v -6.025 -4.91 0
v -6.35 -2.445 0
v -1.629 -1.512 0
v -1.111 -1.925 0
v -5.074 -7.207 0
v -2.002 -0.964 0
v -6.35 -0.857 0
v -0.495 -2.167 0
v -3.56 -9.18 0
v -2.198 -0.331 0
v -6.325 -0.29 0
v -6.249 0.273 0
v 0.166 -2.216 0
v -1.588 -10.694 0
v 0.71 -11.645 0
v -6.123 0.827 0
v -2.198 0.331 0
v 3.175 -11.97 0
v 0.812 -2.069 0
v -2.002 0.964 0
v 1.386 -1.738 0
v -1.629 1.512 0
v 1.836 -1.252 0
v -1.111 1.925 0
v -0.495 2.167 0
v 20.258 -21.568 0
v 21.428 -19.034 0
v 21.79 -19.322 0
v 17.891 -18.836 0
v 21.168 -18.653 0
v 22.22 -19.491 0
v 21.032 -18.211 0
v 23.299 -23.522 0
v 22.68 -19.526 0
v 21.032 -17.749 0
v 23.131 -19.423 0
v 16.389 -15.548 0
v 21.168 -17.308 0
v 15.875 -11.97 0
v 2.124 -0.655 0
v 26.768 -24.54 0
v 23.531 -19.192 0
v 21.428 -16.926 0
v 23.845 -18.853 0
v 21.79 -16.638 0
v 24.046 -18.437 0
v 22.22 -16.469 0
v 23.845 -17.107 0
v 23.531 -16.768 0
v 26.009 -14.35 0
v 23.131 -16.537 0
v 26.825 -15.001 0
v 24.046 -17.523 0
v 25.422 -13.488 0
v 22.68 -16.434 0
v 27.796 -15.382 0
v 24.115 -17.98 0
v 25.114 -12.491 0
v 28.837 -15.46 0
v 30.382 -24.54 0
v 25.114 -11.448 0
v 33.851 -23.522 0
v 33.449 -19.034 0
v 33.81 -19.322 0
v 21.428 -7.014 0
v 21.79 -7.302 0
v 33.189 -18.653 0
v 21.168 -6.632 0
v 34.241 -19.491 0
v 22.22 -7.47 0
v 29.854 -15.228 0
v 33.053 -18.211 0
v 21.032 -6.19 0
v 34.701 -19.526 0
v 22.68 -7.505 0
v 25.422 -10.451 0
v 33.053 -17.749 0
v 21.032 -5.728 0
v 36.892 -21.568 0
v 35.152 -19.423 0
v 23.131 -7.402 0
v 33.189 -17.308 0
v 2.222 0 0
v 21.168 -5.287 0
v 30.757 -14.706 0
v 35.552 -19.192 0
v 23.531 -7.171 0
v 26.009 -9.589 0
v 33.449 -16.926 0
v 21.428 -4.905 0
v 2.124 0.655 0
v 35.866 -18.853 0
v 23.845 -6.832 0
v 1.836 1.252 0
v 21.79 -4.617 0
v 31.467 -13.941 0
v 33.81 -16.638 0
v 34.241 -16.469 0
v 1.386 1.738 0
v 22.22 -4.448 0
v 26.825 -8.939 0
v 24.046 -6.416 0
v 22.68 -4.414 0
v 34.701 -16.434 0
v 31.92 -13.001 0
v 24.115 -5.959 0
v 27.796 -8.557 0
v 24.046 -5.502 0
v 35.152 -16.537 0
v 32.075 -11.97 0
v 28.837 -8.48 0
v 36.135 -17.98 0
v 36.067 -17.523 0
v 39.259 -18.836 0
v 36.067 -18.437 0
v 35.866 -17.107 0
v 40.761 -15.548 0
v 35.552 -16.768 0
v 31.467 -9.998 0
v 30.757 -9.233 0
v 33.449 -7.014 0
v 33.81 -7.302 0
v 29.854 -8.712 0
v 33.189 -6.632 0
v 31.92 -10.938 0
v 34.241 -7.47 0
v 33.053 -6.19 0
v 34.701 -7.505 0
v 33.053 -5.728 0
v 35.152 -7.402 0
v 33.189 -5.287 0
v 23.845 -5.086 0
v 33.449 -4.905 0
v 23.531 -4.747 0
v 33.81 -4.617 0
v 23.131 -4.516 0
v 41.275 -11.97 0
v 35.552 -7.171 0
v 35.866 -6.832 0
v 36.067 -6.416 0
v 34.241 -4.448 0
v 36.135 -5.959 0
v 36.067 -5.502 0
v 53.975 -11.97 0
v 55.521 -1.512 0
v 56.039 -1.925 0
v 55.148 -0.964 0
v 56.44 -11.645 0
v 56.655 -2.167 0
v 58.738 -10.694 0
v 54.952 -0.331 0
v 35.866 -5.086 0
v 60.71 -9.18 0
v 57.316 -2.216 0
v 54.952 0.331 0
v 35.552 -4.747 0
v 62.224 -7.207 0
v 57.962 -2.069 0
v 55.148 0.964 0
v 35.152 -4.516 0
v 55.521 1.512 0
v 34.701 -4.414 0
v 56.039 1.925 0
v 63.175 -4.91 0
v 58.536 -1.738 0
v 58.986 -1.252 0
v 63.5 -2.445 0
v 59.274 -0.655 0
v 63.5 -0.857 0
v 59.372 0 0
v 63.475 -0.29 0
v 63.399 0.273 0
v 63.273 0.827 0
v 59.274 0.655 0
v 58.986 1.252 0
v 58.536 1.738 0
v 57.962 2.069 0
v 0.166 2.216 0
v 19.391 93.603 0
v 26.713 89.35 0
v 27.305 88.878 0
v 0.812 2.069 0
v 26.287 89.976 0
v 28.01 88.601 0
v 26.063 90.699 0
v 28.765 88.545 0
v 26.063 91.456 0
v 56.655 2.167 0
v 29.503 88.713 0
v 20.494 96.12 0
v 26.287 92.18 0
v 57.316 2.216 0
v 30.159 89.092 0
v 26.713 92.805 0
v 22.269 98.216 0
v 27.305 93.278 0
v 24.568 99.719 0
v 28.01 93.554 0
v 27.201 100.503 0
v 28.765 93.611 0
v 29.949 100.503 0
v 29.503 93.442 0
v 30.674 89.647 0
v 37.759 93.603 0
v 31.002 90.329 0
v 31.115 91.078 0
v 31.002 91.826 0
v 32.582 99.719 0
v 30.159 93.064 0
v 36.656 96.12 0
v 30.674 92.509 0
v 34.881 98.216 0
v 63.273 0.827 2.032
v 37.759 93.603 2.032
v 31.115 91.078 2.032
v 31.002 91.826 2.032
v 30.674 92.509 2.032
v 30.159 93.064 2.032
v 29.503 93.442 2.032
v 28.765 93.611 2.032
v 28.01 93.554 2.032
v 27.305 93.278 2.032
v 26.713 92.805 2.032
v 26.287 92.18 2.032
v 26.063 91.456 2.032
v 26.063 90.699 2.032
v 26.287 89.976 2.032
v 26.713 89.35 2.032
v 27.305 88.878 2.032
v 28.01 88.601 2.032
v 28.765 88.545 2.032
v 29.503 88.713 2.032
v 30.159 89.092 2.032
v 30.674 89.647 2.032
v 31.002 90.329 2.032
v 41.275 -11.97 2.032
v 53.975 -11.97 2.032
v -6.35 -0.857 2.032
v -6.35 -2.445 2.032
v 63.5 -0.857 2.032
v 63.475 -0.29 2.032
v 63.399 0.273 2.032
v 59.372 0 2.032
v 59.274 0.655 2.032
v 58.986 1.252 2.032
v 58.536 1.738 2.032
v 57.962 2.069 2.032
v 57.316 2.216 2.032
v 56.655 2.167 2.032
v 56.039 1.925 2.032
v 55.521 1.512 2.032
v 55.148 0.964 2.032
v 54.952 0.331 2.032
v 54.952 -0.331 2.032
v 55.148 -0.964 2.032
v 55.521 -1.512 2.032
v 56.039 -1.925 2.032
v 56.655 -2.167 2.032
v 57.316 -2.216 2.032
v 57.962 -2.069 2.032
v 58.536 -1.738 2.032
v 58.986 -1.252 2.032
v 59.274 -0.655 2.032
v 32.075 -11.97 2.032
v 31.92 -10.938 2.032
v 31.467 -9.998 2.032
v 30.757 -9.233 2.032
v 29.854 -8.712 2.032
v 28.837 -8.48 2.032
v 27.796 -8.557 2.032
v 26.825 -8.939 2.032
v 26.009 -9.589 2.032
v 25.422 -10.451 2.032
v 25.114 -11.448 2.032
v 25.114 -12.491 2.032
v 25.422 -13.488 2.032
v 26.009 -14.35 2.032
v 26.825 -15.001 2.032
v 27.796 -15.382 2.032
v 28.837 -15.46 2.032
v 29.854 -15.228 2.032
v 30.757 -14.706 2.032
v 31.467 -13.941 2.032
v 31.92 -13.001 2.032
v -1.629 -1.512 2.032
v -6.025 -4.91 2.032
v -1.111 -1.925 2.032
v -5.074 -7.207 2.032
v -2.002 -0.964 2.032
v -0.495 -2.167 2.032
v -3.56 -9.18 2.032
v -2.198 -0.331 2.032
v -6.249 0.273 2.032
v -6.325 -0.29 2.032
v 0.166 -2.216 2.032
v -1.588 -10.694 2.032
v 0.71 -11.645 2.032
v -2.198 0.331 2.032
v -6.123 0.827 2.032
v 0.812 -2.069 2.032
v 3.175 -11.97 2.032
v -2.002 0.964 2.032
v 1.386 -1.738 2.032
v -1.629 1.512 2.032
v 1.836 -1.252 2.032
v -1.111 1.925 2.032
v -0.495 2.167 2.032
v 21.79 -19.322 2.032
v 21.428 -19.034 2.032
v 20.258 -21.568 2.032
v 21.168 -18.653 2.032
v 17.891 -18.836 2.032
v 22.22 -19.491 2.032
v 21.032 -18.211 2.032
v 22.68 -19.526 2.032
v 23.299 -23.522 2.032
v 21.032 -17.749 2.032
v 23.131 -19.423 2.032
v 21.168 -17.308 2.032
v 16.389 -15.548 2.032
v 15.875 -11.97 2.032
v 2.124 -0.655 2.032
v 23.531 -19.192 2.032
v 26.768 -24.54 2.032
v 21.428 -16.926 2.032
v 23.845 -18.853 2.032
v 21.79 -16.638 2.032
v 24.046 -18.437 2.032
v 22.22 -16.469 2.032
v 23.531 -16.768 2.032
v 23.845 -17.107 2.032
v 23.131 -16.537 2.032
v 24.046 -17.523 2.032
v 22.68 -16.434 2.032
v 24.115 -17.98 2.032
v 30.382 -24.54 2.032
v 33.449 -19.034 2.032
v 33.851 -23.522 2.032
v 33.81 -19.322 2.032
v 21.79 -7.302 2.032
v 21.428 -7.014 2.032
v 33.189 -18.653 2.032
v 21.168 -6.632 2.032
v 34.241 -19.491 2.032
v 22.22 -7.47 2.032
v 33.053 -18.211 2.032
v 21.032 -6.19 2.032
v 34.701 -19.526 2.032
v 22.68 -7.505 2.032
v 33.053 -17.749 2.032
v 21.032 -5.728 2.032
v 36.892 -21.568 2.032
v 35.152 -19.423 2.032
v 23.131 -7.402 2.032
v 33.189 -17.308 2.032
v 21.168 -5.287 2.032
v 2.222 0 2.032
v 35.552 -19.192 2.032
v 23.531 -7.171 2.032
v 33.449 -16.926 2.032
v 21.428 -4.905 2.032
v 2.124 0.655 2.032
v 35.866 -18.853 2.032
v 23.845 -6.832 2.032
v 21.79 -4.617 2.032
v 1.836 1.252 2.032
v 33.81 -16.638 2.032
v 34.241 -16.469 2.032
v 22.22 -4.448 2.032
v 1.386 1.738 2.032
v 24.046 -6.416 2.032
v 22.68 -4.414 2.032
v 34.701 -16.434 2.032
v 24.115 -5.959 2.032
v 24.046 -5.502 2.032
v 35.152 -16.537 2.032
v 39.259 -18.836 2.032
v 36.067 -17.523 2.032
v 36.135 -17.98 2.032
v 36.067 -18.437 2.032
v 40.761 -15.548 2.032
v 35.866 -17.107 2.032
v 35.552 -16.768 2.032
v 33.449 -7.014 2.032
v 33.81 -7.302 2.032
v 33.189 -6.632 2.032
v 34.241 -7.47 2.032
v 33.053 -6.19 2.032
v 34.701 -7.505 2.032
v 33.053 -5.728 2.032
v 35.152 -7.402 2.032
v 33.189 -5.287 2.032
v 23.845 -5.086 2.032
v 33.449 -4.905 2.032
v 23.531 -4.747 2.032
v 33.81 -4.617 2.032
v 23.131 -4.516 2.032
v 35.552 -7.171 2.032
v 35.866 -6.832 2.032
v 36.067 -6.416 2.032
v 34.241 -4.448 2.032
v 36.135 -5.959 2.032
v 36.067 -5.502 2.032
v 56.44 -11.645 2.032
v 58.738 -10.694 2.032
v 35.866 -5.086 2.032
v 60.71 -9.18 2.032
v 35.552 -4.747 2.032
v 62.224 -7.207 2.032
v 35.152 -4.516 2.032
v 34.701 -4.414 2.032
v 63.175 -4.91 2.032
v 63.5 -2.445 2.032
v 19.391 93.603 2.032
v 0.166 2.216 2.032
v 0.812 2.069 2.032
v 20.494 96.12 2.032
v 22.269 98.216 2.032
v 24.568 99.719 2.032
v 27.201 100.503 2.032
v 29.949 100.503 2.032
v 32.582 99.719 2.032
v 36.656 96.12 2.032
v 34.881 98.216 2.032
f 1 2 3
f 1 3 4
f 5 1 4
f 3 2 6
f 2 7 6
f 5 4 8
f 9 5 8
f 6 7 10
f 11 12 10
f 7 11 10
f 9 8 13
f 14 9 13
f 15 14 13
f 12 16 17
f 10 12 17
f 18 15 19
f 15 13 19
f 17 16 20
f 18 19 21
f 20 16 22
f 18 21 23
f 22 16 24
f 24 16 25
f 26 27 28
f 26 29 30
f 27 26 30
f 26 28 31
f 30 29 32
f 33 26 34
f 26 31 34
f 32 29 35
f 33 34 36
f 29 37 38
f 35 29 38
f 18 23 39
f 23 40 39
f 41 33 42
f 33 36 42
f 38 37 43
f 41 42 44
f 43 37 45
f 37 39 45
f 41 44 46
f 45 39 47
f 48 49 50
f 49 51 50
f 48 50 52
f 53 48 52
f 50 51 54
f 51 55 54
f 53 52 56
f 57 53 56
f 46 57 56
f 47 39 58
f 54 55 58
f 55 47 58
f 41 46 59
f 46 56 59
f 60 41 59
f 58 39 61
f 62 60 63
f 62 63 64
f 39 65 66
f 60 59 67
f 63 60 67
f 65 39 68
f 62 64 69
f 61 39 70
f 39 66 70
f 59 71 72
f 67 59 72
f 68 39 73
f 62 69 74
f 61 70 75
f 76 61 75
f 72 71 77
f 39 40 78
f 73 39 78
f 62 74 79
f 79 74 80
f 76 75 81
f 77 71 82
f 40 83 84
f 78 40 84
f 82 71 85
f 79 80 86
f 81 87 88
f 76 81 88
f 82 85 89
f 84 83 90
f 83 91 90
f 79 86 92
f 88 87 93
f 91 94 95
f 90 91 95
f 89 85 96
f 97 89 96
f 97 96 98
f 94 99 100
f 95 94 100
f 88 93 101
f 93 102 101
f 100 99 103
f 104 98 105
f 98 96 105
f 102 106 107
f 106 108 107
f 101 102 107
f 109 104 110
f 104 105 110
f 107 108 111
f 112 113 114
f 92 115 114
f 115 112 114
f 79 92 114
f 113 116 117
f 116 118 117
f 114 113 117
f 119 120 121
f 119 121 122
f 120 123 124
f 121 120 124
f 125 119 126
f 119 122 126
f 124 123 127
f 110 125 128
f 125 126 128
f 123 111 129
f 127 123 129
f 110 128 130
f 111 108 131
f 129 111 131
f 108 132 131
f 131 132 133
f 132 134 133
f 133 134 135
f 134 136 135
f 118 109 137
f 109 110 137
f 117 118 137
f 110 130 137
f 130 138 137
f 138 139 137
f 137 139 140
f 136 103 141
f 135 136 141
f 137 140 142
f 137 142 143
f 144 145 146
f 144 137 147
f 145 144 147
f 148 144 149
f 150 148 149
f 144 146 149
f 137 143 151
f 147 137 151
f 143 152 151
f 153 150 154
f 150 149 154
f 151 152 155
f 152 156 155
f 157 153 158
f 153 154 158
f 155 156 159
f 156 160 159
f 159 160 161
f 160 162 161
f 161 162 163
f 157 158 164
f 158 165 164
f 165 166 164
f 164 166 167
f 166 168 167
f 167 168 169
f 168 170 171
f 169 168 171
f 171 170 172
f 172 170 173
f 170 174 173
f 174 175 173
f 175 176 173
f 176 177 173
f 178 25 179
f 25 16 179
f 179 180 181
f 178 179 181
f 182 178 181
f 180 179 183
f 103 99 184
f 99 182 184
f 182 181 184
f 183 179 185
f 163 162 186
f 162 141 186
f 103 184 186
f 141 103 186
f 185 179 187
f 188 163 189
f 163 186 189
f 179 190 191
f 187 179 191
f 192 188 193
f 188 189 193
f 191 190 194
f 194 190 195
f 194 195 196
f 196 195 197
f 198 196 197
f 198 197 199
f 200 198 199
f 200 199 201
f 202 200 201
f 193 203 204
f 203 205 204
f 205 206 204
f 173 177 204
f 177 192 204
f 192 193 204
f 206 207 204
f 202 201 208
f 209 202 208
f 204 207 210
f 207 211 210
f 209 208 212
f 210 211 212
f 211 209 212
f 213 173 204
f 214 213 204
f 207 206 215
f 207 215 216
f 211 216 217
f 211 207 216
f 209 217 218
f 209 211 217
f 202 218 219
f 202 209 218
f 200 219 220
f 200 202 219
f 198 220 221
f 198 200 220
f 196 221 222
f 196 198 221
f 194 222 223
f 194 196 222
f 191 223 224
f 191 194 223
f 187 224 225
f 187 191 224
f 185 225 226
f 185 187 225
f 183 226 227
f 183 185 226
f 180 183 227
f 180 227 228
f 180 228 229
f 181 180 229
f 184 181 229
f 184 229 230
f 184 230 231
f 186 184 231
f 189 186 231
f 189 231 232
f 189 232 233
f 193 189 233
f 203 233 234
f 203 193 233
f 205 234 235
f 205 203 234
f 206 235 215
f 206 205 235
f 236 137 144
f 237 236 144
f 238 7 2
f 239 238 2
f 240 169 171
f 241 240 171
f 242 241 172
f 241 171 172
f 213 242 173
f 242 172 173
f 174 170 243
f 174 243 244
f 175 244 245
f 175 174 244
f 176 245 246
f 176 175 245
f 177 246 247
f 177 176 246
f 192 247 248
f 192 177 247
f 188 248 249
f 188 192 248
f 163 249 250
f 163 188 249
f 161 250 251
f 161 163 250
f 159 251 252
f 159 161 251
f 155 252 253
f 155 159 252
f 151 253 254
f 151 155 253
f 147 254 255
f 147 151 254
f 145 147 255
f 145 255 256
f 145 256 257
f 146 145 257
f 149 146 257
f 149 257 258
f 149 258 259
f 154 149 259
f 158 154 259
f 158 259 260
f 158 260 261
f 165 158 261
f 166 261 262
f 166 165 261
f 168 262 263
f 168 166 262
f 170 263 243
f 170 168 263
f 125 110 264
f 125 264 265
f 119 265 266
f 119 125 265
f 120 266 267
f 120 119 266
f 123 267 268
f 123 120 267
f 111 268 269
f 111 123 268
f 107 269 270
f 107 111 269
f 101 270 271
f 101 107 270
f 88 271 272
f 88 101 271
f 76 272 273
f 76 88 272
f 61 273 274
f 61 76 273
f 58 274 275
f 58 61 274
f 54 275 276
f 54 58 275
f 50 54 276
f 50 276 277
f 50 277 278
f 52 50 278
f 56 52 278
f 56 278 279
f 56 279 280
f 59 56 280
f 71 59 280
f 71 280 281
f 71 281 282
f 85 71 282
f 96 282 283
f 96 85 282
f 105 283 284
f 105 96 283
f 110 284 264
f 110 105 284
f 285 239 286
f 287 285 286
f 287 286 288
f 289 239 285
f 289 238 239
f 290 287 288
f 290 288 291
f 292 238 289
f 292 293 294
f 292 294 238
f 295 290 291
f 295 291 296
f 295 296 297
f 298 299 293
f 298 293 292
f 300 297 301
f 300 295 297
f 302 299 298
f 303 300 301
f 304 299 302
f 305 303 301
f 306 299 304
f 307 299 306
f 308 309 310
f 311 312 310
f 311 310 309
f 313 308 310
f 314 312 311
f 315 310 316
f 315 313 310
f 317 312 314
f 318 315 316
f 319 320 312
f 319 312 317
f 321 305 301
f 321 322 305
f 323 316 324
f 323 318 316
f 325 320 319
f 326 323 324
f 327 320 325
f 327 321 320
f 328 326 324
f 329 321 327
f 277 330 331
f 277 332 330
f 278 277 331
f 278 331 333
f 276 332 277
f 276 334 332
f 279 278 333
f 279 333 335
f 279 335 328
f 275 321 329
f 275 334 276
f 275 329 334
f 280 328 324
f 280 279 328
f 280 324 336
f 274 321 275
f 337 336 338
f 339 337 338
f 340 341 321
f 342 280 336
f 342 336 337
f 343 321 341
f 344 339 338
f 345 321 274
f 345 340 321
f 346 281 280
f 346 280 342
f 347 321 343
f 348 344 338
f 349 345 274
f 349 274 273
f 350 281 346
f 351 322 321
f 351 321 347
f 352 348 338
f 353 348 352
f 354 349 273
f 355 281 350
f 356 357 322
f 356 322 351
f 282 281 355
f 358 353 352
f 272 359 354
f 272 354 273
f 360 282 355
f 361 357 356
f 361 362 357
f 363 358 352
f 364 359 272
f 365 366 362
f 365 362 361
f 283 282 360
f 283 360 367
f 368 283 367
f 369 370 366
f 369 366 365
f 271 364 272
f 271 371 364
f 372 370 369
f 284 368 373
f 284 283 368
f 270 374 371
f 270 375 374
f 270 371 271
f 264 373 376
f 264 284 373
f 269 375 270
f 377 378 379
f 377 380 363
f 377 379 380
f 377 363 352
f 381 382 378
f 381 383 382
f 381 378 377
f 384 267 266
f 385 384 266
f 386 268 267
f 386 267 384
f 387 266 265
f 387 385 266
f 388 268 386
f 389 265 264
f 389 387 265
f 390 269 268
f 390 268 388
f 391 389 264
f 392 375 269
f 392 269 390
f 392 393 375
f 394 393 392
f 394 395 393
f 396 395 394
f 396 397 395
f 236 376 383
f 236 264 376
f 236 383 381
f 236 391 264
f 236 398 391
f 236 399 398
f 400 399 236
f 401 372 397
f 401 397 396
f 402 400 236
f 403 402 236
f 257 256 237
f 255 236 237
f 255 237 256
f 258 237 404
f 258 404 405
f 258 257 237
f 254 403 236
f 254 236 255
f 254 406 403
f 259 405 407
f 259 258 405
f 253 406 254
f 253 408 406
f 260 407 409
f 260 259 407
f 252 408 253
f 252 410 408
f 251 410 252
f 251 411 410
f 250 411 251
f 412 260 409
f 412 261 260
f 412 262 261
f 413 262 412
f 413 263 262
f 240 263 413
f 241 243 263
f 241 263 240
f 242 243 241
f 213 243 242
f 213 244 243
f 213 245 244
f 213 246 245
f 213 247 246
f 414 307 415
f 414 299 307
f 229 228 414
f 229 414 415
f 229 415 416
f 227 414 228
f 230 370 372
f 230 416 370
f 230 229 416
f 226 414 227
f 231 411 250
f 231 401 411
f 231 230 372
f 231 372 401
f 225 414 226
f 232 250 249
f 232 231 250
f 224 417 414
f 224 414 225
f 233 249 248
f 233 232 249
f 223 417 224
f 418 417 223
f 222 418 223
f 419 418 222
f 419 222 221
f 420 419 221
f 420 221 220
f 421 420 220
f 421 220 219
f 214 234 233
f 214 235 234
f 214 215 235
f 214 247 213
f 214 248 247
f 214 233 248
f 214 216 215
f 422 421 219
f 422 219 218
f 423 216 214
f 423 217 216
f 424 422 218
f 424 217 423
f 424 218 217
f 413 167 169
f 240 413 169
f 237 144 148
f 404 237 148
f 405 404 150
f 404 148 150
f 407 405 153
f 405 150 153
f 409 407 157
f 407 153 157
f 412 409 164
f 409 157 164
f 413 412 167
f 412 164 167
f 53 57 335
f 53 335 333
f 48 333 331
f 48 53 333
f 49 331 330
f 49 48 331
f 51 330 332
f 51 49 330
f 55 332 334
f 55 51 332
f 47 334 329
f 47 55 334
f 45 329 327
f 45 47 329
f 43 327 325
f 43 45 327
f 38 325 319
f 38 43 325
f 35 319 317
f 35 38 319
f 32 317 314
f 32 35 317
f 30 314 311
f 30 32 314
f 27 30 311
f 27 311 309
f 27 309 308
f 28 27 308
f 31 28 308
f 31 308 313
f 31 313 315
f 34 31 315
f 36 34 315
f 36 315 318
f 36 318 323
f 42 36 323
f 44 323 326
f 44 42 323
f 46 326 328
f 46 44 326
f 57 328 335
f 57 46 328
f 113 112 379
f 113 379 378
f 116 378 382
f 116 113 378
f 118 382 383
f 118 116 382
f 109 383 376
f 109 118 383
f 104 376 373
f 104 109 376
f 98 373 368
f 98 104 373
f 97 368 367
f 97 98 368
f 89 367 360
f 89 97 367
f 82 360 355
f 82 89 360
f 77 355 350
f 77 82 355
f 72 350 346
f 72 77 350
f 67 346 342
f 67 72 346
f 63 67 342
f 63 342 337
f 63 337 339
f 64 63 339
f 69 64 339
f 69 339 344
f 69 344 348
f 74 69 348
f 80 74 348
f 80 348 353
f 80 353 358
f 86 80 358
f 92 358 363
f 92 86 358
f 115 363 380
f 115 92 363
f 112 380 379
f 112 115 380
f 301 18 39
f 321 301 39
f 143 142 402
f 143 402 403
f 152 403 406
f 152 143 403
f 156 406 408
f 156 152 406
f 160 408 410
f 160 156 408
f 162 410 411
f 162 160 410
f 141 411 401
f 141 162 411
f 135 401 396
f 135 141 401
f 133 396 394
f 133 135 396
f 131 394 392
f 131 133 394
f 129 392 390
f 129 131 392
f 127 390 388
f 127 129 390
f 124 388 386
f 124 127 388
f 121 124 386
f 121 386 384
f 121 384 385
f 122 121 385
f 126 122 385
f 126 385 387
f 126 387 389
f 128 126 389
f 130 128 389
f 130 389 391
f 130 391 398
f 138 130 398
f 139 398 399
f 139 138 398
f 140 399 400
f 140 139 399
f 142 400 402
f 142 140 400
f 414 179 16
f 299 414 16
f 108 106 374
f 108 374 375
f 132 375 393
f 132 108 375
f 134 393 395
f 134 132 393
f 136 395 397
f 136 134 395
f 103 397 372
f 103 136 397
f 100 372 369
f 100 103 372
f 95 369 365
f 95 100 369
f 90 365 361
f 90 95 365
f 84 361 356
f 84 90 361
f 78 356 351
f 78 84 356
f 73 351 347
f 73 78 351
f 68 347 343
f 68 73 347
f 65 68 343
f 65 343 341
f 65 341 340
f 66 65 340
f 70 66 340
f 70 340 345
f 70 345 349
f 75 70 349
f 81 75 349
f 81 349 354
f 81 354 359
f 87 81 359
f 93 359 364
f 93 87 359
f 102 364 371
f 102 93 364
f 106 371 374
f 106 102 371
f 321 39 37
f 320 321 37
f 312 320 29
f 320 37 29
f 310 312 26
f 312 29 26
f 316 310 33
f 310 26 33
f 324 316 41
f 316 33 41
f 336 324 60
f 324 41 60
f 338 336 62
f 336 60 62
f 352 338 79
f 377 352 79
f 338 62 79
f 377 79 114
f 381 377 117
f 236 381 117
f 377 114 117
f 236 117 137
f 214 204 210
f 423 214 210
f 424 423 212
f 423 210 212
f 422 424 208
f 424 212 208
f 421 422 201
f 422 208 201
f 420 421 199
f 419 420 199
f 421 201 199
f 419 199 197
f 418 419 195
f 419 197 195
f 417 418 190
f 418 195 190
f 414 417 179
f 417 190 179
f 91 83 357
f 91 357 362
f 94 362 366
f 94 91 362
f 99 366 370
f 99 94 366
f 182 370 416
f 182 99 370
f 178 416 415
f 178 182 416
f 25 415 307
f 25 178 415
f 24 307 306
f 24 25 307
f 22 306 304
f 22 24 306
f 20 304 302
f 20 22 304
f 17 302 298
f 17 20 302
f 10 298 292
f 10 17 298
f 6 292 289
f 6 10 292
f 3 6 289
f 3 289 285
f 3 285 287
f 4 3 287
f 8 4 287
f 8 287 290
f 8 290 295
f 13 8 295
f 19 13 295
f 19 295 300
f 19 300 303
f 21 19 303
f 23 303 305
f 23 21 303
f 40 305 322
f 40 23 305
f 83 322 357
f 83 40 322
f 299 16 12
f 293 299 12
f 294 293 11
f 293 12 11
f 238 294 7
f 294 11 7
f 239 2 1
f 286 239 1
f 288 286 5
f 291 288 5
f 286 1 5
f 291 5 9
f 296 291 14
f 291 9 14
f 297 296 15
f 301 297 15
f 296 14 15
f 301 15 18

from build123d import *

# Parameters (mm, degrees)
SKETCH1_R           = 2.2225
SKETCH1_R_2         = 1.55
SKETCH1_R_3         = 2.539999998
SKETCH1_R_4         = 3.5
BOSS_EXTRUDE1_DEPTH = 2.032


with BuildPart() as part:
    # Sketch1 → Boss-Extrude1 (new body)
    with BuildSketch(Plane.XY):
        with BuildLine():
            Line((41.275, -11.969713646), (53.975, -11.969713646))
            ThreePointArc((53.975, -11.969713646), (60.710192091, -9.179905737), (63.5, -2.444713646))
            Line((63.5, -2.444713646), (63.5, -0.857213646))
            ThreePointArc((63.5, -0.857213646), (63.442919511, -0.007705539), (63.272704244, 0.826530021))
            Line((63.272704244, 0.826530021), (37.759056366, 93.603431401))
            ThreePointArc((37.759056366, 93.603431401), (28.575, 100.6028159), (19.390943634, 93.603431401))
            Line((19.390943634, 93.603431401), (-6.122704244, 0.826530021))
            ThreePointArc((-6.122704244, 0.826530021), (-6.292919511, -0.007705539), (-6.35, -0.857213646))
            Line((-6.35, -0.857213646), (-6.35, -2.444713646))
            ThreePointArc((-6.35, -2.444713646), (-3.560192091, -9.179905737), (3.175, -11.969713646))
            Line((3.175, -11.969713646), (15.875, -11.969713646))
            ThreePointArc((15.875, -11.969713646), (28.575, -24.669713646), (41.275, -11.969713646))
        make_face()
        Circle(SKETCH1_R, mode=Mode.SUBTRACT)
        with Locations((57.15, 0)):
            Circle(SKETCH1_R, mode=Mode.SUBTRACT)
        with Locations((22.56459236, -5.959306006)):
            Circle(SKETCH1_R_2, mode=Mode.SUBTRACT)
        with Locations((28.575, 91.0778159)):
            Circle(SKETCH1_R_3, mode=Mode.SUBTRACT)
        with Locations((28.575, -11.969713646)):
            Circle(SKETCH1_R_4, mode=Mode.SUBTRACT)
        with Locations((34.58540764, -17.980121287)):
            Circle(SKETCH1_R_2, mode=Mode.SUBTRACT)
        with Locations((34.58540764, -5.959306006)):
            Circle(SKETCH1_R_2, mode=Mode.SUBTRACT)
        with Locations((22.56459236, -17.980121287)):
            Circle(SKETCH1_R_2, mode=Mode.SUBTRACT)
    extrude(amount=BOSS_EXTRUDE1_DEPTH)


solid = part.part
